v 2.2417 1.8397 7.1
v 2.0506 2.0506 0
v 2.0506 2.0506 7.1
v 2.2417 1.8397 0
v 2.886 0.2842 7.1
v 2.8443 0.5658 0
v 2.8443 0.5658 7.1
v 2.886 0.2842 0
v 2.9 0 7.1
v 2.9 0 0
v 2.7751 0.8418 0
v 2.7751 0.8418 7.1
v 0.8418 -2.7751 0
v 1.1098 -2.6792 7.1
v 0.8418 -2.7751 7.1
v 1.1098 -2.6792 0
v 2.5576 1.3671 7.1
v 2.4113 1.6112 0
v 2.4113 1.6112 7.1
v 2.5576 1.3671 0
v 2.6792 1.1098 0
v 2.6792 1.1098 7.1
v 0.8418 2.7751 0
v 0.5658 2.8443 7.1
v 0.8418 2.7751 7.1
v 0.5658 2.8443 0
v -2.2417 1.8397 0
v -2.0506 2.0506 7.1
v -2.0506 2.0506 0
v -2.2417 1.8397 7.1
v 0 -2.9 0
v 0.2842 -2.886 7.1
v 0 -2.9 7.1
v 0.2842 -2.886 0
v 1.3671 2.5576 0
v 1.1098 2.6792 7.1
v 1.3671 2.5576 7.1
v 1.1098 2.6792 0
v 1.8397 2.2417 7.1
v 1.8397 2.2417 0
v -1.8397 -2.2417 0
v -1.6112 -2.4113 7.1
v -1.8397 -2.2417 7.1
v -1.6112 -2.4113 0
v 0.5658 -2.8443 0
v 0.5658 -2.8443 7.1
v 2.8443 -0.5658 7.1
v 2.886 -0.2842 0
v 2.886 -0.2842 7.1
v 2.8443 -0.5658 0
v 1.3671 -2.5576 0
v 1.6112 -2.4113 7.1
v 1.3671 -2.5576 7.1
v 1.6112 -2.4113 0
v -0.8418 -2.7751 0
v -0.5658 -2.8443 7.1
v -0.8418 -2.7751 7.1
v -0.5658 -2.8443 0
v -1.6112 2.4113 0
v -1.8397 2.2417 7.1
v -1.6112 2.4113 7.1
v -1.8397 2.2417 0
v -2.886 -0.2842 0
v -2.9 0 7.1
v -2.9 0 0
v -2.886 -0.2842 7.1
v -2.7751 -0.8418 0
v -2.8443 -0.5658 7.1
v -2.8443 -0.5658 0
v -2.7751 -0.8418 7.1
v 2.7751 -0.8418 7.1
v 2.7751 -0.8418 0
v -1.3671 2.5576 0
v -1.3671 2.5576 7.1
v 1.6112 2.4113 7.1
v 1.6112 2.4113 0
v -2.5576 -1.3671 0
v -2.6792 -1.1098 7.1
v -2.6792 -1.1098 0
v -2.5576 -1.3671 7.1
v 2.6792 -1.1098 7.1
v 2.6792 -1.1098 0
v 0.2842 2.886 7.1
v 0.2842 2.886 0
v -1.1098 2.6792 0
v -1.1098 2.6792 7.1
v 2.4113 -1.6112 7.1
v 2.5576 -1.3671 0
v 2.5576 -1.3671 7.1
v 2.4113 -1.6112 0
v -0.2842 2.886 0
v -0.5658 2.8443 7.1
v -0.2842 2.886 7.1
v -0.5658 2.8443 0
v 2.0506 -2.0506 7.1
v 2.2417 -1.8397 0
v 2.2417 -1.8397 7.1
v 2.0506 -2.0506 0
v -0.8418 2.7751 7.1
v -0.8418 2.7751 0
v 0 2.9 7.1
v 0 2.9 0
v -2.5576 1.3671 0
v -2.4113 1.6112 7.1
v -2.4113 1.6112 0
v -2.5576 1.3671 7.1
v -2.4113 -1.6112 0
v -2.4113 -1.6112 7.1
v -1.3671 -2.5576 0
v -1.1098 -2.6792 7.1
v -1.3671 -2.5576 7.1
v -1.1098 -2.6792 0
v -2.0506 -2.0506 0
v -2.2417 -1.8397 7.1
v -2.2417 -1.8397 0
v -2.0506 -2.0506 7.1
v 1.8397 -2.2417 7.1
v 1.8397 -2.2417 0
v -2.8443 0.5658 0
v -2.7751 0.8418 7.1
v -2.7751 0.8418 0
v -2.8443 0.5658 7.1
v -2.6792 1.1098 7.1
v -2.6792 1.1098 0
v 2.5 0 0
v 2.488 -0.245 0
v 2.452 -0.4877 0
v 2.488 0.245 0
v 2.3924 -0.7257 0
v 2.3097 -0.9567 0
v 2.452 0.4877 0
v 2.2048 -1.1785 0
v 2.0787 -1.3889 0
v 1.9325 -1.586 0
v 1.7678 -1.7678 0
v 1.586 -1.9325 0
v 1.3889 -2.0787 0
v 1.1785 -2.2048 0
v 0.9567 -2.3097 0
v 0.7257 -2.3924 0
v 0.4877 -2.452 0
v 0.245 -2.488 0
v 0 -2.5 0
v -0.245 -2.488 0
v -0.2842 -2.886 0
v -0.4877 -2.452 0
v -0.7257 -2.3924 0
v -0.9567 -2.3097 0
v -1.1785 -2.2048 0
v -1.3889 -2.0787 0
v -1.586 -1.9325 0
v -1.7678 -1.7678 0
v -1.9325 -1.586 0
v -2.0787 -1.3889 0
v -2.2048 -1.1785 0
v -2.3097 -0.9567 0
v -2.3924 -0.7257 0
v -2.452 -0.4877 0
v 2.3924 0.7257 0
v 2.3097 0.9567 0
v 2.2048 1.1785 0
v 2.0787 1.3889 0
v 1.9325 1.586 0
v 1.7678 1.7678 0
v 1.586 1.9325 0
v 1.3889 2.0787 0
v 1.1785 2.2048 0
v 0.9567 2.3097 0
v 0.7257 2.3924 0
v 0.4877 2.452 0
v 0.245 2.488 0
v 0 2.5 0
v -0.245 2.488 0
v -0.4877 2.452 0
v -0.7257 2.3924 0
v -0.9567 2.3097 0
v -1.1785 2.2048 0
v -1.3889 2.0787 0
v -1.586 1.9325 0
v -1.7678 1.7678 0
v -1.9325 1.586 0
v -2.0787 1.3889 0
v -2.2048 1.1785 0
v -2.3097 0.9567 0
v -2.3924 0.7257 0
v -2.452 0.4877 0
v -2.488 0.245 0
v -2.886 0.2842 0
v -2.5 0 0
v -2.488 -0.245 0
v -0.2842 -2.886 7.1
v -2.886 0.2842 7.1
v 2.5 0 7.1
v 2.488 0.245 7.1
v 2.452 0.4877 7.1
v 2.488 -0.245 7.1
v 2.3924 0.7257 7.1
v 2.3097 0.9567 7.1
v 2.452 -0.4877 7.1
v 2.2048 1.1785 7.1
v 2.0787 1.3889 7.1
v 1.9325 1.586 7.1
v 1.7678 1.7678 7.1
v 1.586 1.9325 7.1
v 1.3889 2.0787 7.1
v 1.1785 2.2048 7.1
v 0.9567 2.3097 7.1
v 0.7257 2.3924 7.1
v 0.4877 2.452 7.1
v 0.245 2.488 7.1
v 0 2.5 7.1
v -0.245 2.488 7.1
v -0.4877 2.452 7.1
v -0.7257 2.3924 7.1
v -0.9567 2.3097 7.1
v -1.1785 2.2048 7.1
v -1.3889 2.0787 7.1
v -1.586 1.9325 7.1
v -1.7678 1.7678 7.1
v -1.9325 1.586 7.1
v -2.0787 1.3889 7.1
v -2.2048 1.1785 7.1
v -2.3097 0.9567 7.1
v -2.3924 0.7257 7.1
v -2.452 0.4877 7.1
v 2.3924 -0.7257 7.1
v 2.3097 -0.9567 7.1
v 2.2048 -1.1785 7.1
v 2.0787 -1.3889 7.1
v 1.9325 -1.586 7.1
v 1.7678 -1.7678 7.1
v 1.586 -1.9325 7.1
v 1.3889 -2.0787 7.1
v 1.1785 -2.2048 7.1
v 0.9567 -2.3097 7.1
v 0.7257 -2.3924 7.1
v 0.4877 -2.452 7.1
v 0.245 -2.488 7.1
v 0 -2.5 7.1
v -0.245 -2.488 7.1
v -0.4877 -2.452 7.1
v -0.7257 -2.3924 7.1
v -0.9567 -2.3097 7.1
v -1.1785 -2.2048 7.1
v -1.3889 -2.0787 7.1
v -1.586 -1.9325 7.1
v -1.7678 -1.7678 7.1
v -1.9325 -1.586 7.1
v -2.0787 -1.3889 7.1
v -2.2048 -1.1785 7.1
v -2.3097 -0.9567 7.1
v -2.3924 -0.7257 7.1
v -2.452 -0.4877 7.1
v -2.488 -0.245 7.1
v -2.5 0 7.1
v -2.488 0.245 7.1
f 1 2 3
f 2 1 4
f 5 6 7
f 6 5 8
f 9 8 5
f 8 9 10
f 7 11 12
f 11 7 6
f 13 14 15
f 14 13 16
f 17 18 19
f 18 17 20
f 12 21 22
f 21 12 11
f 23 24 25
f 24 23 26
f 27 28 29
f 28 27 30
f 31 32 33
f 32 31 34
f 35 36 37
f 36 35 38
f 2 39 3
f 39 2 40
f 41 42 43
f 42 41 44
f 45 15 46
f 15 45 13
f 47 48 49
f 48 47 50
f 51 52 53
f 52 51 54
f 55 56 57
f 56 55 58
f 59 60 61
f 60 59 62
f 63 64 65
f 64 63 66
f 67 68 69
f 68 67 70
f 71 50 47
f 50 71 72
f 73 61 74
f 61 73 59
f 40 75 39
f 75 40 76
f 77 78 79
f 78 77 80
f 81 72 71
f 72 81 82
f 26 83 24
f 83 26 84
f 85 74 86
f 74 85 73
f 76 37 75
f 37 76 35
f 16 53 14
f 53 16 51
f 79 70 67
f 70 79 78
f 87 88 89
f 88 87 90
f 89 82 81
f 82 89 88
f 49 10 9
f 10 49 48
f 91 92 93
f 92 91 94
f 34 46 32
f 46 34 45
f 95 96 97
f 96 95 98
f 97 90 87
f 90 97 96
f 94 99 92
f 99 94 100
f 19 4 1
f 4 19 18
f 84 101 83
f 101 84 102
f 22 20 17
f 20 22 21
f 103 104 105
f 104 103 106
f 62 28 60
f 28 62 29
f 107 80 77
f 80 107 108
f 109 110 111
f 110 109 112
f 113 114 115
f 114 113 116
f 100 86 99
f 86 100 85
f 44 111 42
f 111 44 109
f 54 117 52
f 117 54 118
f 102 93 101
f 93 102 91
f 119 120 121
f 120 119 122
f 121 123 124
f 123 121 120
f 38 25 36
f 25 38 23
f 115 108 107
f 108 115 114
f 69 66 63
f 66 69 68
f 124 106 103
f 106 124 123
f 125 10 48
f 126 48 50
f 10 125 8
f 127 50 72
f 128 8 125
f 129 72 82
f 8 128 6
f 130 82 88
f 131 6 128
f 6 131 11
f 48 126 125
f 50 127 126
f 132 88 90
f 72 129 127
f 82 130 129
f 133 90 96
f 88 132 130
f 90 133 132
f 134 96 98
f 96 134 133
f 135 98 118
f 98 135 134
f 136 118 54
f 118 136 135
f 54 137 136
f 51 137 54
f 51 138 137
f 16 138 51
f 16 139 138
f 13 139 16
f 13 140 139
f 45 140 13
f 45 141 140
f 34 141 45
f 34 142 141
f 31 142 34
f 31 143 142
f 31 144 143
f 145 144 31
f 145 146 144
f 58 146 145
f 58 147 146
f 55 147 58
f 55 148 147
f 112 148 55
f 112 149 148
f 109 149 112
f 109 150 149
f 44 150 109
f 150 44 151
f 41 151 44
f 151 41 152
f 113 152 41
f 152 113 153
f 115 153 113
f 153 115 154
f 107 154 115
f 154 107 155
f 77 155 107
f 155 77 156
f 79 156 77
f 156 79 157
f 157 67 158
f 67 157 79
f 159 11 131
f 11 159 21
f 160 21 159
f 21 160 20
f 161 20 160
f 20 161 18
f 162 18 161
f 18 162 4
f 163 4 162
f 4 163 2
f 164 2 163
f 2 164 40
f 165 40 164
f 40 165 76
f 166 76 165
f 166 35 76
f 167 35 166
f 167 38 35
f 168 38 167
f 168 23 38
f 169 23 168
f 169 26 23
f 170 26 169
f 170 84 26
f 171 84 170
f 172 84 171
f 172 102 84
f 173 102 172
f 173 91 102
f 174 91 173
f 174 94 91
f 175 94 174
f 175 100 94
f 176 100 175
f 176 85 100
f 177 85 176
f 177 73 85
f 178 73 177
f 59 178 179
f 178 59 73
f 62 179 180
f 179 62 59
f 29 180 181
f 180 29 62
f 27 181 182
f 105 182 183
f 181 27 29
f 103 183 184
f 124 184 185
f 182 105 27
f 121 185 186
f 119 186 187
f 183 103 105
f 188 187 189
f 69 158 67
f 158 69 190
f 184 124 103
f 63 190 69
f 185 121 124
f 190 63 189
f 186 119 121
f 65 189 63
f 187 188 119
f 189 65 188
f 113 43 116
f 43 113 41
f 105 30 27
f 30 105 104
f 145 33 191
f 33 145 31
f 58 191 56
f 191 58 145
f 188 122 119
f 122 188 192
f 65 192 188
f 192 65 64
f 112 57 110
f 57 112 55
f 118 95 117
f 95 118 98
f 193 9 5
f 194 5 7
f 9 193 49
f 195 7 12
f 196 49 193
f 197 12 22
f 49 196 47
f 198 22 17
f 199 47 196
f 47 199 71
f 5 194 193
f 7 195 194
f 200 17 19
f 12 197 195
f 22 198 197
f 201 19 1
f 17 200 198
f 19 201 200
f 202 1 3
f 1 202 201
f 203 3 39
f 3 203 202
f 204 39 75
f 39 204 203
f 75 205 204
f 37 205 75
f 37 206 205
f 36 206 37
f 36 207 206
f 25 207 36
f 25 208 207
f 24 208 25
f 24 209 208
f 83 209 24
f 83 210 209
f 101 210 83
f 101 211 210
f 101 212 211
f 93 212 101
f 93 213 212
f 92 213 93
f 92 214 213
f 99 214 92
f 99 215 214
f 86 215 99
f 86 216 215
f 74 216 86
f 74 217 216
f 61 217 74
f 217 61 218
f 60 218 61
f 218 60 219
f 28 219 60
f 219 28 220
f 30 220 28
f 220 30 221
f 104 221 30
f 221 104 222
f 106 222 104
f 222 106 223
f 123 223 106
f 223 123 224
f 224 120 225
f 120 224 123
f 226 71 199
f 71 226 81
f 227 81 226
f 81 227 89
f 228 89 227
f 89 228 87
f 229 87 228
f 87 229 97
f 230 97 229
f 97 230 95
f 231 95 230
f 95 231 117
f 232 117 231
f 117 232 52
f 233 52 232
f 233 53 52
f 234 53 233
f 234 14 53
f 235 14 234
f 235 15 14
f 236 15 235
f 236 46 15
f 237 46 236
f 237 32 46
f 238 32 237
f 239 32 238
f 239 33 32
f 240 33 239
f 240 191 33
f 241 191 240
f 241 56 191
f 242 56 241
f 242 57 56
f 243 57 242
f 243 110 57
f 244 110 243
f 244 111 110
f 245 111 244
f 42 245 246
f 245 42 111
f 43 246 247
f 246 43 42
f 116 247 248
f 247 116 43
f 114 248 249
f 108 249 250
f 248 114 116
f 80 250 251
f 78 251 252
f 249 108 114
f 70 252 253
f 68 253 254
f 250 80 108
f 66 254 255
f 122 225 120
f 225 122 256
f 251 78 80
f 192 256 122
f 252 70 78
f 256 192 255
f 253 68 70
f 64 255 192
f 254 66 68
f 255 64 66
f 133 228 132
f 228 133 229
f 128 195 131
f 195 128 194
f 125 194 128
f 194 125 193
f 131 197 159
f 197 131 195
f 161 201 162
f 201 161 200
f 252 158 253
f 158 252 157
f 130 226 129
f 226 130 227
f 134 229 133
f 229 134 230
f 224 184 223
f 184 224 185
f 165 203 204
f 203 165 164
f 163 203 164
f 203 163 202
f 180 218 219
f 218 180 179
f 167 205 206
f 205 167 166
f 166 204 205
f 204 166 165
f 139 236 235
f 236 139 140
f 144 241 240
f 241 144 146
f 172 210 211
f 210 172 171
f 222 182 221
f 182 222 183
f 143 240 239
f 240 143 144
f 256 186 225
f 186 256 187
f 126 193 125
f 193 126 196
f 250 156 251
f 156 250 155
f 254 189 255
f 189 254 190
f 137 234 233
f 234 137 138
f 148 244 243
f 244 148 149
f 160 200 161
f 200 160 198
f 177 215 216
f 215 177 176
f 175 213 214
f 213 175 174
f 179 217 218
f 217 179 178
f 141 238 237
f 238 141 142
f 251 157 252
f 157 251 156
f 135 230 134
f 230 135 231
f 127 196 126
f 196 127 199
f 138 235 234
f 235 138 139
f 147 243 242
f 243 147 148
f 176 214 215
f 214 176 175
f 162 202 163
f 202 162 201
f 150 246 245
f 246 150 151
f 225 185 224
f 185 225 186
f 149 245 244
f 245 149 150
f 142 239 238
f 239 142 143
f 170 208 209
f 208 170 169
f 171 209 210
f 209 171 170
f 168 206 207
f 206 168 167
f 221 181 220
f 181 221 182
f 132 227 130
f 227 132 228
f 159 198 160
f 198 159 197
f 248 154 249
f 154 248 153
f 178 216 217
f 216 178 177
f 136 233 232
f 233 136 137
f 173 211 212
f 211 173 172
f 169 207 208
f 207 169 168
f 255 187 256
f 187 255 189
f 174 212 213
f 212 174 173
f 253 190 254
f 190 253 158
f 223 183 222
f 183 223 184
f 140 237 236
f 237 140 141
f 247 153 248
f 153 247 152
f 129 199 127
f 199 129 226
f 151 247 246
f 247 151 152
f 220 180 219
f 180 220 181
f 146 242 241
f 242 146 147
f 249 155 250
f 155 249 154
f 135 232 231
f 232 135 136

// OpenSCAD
module threaded_insert() {
    difference() {
        cylinder(h=7.1, d=5.8, $fn=64);
        translate([0, 0, -1])
            cylinder(h=9.1, d=5.0, $fn=64);
    }
}

threaded_insert();
